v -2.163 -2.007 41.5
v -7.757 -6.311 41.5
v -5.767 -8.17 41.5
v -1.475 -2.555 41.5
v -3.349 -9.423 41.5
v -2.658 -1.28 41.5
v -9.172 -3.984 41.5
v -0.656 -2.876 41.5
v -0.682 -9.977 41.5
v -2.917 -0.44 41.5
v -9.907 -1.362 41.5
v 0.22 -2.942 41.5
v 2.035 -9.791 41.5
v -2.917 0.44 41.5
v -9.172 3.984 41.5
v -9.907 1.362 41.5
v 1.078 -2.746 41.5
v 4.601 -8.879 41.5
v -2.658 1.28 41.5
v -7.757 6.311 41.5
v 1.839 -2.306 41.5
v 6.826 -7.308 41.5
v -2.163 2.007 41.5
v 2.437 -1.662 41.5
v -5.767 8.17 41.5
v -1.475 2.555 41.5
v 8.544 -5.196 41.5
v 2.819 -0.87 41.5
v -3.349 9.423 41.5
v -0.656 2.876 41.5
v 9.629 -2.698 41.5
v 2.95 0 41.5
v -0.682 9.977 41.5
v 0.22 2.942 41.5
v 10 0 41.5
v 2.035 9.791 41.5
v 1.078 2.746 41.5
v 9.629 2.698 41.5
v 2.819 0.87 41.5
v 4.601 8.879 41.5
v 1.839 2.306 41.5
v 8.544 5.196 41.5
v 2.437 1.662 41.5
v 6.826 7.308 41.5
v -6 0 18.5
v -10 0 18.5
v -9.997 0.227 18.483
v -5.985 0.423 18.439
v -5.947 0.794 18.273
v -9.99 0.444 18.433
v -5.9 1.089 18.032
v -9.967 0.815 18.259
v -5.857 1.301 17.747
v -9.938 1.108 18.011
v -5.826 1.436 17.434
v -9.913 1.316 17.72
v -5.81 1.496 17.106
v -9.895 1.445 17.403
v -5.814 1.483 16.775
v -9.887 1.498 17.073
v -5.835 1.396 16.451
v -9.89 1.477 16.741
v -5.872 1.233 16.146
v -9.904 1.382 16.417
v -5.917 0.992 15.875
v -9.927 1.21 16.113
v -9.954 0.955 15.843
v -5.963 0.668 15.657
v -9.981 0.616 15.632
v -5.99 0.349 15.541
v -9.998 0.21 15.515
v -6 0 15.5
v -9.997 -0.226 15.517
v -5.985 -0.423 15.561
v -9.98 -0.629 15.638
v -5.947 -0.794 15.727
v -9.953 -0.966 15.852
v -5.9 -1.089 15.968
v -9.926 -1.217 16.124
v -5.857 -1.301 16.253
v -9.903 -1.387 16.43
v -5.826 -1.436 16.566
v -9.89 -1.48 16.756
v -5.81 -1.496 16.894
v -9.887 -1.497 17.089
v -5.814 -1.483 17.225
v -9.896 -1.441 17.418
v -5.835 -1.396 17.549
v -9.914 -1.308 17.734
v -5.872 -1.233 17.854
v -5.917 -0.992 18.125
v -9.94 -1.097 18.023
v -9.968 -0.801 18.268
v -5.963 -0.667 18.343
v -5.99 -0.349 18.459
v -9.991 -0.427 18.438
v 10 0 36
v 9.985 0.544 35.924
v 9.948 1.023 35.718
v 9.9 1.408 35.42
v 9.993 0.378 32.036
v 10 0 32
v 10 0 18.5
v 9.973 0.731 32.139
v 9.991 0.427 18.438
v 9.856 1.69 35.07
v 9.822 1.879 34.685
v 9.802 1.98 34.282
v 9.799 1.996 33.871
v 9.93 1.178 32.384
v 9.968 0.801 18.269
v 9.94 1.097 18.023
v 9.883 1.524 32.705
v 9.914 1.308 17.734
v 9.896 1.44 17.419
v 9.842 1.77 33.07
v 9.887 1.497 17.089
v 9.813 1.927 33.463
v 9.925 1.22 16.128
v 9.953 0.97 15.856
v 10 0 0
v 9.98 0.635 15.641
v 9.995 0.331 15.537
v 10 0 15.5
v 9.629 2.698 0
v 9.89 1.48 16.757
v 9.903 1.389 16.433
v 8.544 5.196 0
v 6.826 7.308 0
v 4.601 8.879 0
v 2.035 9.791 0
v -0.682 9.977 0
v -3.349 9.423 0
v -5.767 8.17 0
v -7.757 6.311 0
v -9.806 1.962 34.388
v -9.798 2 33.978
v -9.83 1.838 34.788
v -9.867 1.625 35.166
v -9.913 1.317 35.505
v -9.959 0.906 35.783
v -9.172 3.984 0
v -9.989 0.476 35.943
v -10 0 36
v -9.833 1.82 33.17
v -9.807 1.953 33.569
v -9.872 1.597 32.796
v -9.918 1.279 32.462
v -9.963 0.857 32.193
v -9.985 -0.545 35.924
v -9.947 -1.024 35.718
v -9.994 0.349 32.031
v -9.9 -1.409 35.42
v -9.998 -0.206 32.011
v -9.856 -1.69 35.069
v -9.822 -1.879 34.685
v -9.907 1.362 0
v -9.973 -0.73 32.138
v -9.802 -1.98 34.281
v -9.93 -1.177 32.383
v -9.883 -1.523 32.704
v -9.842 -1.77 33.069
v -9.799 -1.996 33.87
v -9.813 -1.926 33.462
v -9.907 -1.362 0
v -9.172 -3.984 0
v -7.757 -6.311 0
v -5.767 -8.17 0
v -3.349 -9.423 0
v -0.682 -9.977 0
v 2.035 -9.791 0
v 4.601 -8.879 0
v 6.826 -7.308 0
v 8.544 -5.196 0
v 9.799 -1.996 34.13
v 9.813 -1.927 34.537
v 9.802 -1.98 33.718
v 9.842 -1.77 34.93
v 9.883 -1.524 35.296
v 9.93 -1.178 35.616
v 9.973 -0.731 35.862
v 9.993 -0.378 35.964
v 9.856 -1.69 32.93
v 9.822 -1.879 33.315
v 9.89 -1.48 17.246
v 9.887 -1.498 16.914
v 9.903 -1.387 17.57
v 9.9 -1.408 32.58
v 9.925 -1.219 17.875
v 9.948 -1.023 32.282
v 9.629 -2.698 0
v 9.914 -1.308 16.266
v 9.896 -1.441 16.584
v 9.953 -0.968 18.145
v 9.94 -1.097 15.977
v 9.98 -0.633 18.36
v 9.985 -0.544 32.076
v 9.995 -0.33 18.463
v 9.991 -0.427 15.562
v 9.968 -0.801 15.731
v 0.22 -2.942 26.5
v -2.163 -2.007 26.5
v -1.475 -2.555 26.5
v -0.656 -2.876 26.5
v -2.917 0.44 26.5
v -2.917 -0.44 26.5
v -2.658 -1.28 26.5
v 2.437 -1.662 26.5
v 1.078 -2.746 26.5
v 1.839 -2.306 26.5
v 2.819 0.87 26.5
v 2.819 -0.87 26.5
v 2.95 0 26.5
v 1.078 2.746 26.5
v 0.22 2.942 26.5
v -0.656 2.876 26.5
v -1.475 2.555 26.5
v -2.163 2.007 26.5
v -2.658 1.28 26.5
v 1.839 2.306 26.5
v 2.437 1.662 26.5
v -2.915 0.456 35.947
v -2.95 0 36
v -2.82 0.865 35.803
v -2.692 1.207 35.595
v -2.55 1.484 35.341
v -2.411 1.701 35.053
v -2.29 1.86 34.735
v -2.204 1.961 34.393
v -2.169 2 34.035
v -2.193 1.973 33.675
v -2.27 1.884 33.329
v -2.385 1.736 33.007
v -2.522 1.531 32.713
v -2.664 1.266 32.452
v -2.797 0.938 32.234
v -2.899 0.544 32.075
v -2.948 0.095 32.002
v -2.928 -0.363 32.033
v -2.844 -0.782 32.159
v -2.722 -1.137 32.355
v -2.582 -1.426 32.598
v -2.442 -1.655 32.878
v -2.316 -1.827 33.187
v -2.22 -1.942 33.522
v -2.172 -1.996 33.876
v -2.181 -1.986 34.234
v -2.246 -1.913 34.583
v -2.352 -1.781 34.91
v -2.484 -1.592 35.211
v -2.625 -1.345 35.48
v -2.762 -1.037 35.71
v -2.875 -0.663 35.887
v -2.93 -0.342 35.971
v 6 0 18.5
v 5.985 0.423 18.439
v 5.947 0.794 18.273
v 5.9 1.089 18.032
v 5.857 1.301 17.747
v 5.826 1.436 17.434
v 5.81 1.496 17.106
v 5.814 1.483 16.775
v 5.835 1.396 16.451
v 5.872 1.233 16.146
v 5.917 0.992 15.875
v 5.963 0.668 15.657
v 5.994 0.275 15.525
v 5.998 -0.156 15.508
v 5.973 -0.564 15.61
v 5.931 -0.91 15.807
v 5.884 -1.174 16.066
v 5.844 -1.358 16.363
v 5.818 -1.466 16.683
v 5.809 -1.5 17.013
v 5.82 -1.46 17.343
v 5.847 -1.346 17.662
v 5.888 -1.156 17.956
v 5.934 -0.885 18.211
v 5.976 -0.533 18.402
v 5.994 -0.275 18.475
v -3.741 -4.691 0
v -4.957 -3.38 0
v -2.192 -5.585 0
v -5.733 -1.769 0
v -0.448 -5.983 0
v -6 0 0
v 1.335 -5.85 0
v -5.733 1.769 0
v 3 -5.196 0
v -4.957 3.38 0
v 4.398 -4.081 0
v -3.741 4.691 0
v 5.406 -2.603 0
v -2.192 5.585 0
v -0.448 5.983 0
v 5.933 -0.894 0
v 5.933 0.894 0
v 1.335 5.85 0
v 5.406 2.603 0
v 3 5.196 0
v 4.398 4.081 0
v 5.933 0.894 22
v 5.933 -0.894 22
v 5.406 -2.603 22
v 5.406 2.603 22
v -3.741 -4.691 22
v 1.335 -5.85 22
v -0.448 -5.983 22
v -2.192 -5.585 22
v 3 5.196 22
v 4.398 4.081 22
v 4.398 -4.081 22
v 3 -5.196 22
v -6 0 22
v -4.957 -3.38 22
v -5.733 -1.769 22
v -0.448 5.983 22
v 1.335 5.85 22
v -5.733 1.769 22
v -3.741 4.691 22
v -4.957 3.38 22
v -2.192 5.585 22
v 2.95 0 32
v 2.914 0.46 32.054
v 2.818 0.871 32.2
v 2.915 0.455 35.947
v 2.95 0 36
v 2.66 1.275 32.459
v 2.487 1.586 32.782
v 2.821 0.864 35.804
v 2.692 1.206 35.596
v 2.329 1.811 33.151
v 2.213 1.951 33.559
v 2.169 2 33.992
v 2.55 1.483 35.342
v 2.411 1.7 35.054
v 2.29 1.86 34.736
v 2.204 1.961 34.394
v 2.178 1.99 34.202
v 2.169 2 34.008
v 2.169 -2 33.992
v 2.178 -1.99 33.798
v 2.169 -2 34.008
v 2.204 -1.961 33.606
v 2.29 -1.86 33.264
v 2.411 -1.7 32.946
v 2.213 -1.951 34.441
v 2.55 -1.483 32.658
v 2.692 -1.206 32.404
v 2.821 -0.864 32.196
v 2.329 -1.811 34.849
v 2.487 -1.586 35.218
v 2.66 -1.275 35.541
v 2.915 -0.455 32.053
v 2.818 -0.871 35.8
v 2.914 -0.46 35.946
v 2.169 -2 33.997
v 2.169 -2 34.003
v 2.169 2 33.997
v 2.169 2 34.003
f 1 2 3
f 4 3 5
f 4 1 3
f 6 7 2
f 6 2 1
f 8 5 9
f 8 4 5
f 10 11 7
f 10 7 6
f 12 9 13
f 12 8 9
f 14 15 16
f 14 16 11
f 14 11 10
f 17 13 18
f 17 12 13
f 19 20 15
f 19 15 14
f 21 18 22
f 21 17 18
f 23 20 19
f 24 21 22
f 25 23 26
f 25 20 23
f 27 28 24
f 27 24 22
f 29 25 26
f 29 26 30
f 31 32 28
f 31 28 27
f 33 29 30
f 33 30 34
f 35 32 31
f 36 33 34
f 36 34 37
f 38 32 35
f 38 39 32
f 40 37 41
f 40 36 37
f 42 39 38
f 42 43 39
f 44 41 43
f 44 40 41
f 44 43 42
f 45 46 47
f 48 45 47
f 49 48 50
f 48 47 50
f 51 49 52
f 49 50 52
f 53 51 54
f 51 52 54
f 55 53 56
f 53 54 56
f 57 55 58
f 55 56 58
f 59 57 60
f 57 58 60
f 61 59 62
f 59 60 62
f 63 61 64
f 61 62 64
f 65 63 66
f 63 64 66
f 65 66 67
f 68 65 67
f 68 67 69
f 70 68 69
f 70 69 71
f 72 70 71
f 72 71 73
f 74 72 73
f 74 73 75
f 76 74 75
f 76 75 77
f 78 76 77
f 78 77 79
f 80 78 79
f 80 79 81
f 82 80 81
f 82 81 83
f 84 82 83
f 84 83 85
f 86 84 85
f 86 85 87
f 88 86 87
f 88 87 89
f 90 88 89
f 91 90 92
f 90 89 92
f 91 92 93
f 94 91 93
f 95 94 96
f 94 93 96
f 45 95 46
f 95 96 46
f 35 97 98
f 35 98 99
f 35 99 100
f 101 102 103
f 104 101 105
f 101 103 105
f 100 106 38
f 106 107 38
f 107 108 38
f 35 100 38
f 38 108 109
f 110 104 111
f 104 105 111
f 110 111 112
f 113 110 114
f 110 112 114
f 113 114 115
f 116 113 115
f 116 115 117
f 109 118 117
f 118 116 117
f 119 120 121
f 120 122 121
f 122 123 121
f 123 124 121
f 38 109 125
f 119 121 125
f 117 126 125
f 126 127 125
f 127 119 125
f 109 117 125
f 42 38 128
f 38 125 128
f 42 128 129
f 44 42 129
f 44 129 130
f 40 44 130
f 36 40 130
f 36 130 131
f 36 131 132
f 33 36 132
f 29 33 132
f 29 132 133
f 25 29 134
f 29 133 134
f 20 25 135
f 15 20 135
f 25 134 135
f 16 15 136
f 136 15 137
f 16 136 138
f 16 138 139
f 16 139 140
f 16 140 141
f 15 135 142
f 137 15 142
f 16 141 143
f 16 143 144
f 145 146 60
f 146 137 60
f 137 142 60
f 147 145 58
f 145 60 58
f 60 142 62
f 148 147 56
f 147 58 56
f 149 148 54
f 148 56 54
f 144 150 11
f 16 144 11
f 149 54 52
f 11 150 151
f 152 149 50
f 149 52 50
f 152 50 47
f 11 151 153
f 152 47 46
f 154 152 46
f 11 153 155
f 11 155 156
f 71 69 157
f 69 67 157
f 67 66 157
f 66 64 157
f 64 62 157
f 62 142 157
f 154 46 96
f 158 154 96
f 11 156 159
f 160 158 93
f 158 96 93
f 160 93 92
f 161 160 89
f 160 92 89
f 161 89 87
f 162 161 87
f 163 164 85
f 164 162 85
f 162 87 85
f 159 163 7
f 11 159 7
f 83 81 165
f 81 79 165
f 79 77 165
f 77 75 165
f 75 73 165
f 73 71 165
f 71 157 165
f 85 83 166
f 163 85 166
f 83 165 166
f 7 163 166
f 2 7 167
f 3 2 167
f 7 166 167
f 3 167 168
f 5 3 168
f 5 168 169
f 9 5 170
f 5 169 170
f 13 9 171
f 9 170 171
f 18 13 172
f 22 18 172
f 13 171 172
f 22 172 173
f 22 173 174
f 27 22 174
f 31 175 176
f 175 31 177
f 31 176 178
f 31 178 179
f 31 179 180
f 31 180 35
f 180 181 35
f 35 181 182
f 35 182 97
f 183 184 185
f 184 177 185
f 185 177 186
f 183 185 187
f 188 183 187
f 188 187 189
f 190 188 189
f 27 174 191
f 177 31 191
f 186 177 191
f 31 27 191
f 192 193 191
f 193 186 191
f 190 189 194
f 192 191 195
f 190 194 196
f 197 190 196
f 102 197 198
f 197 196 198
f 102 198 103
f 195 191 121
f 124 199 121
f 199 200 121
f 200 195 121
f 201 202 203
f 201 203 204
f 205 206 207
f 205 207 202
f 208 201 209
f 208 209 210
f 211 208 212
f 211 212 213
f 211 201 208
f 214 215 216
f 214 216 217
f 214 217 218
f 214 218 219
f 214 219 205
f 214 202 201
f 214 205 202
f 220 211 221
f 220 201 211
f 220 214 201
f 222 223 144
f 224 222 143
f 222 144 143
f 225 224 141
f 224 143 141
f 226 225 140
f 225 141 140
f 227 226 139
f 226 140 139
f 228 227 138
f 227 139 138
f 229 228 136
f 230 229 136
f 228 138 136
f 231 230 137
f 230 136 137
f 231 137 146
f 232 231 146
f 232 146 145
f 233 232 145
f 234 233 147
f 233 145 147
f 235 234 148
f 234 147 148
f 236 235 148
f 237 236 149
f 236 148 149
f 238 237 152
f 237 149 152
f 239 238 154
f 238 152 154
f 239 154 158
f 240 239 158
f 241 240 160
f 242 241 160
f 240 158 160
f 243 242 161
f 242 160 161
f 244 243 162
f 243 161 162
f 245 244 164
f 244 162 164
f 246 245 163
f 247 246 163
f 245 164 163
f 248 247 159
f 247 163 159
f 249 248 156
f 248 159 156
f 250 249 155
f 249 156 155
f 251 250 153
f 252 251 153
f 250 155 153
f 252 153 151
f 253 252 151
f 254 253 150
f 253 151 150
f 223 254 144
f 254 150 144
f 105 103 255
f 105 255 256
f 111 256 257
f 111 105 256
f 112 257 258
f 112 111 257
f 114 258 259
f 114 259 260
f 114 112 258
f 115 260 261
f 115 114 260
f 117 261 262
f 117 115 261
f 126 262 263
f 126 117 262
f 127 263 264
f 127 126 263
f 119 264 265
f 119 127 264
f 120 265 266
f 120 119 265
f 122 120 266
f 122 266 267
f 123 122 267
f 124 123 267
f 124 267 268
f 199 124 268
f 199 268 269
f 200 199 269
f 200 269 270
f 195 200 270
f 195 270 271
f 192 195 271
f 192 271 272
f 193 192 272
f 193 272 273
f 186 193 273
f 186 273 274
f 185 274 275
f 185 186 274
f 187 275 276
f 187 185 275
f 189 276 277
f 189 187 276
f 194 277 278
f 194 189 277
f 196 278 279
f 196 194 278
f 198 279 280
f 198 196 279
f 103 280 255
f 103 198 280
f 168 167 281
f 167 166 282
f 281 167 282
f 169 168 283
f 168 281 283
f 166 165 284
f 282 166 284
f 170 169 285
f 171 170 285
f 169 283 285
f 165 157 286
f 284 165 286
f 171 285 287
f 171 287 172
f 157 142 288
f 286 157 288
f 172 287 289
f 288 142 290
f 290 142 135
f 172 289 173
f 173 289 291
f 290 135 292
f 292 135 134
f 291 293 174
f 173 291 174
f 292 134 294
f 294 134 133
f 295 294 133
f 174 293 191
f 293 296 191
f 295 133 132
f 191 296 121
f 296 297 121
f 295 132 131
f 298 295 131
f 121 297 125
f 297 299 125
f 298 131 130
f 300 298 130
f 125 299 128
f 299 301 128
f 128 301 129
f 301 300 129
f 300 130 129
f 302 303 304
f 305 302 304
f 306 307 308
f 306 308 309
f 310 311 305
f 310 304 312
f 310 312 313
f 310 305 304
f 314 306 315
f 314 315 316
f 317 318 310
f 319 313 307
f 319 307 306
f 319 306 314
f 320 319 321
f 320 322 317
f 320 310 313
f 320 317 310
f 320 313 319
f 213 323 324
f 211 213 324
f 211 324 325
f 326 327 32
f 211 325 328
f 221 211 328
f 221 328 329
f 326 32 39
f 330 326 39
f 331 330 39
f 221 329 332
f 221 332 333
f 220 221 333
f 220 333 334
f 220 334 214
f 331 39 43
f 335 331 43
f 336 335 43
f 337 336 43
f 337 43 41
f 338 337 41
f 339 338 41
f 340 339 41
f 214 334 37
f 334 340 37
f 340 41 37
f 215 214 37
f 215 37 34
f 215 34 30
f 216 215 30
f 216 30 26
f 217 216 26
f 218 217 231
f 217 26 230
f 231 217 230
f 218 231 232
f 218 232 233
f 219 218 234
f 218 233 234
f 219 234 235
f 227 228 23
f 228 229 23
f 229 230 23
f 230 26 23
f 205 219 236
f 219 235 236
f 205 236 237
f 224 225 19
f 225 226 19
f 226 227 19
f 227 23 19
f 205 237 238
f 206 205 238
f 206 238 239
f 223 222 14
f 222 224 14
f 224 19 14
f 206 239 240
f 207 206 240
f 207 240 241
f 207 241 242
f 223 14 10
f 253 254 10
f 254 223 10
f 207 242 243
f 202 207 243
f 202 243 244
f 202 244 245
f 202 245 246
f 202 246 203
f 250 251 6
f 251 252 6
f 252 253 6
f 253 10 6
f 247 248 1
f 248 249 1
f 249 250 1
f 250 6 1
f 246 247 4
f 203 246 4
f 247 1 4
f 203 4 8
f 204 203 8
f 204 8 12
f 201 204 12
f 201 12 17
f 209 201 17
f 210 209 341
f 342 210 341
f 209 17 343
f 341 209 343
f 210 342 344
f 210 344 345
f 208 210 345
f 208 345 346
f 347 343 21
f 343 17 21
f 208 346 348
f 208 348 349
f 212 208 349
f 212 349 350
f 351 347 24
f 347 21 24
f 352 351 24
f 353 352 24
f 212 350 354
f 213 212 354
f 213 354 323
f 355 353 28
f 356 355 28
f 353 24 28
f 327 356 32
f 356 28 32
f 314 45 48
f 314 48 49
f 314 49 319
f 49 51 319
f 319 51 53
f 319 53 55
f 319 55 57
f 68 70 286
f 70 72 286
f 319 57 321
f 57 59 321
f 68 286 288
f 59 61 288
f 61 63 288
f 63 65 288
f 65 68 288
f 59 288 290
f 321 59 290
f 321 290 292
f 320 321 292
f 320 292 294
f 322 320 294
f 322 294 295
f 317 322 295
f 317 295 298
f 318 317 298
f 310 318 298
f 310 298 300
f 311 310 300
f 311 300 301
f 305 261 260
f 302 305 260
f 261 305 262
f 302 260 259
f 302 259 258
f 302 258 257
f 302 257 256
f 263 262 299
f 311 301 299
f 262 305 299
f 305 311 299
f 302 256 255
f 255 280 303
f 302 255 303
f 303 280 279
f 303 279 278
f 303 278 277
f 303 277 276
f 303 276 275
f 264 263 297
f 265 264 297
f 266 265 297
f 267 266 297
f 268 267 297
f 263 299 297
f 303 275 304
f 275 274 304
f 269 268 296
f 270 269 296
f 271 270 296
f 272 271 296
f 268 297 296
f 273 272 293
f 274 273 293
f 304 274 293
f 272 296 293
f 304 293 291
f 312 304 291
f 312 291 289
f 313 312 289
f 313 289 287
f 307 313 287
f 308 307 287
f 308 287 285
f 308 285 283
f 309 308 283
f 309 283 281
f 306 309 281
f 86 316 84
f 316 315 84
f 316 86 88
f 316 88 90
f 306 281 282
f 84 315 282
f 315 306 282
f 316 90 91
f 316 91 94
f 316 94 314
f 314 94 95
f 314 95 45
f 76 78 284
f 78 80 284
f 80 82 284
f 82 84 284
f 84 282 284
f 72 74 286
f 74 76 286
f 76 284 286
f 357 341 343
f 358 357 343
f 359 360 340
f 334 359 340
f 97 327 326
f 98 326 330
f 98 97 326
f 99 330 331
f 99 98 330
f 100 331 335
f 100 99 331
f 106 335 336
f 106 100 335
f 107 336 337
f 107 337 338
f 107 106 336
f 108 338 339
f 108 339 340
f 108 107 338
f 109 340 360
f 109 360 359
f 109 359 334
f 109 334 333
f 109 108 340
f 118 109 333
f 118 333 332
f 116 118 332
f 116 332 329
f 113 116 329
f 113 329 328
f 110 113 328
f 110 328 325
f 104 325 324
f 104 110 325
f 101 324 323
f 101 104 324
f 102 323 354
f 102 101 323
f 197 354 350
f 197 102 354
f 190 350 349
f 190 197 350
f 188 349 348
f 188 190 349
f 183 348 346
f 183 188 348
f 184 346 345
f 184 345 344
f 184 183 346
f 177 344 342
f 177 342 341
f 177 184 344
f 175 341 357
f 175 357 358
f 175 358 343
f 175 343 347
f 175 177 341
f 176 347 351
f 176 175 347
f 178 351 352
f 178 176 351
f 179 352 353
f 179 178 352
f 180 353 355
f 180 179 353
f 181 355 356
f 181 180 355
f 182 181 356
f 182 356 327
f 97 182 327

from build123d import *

# Parameters (mm, degrees)
SKETCH1_R           = 10
BOSS_EXTRUDE1_DEPTH = 41.5
SKETCH2_R           = 2.95
CUT_EXTRUDE1_DEPTH  = 15
SKETCH3_R           = 6
CUT_EXTRUDE2_DEPTH  = 22
CUT_EXTRUDE3_REACH  = 22
SKETCH4_R           = 1.5
SKETCH4_R_2         = 2
CUT_EXTRUDE4_START  = -20
SKETCH4_2_R         = 1.5
SKETCH4_2_R_2       = 2
CUT_EXTRUDE4_DEPTH  = 7.831462


with BuildPart() as part:
    # Sketch1 → Boss-Extrude1 (new body)
    with BuildSketch(Plane.XY):
        Circle(SKETCH1_R)
    extrude(amount=BOSS_EXTRUDE1_DEPTH)

    # Sketch2 → Cut-Extrude1 (cut)
    with BuildSketch(Plane.XY.offset(41.5)):
        Circle(SKETCH2_R)
    extrude(amount=-CUT_EXTRUDE1_DEPTH, mode=Mode.SUBTRACT)

    # Sketch3 → Cut-Extrude2 (cut)
    with BuildSketch(Plane(origin=(0, 0, 0), x_dir=(-1, 0, 0), z_dir=(0, 0, -1))):
        Circle(SKETCH3_R)
    extrude(amount=-CUT_EXTRUDE2_DEPTH, mode=Mode.SUBTRACT)

    # Sketch4 → Cut-Extrude3 (cut, up to next)
    with BuildSketch(Plane.ZY.offset(10), mode=Mode.PRIVATE) as cut_extrude3_sk1:
        with Locations((17, 0)):
            Circle(SKETCH4_R)
    cut_extrude3_tool1 = extrude(cut_extrude3_sk1.sketch, amount=-CUT_EXTRUDE3_REACH, mode=Mode.PRIVATE) & part.part
    add(cut_extrude3_tool1.solids().sort_by_distance((-10, 0, 17))[0], mode=Mode.SUBTRACT)
    # Sketch4 → Cut-Extrude3 (cut, up to next)
    with BuildSketch(Plane.ZY.offset(10), mode=Mode.PRIVATE) as cut_extrude3_sk2:
        with Locations((34, 0)):
            Circle(SKETCH4_R_2)
    cut_extrude3_tool2 = extrude(cut_extrude3_sk2.sketch, amount=-CUT_EXTRUDE3_REACH, mode=Mode.PRIVATE) & part.part
    add(cut_extrude3_tool2.solids().sort_by_distance((-10, 0, 34))[0], mode=Mode.SUBTRACT)

    # Sketch4_2 → Cut-Extrude4 (cut)
    with BuildSketch(Plane.ZY.offset(10).offset(CUT_EXTRUDE4_START)):
        with Locations((17, 0)):
            Circle(SKETCH4_2_R)
        with Locations((34, 0)):
            Circle(SKETCH4_2_R_2)
    extrude(amount=CUT_EXTRUDE4_DEPTH, mode=Mode.SUBTRACT)


solid = part.part
